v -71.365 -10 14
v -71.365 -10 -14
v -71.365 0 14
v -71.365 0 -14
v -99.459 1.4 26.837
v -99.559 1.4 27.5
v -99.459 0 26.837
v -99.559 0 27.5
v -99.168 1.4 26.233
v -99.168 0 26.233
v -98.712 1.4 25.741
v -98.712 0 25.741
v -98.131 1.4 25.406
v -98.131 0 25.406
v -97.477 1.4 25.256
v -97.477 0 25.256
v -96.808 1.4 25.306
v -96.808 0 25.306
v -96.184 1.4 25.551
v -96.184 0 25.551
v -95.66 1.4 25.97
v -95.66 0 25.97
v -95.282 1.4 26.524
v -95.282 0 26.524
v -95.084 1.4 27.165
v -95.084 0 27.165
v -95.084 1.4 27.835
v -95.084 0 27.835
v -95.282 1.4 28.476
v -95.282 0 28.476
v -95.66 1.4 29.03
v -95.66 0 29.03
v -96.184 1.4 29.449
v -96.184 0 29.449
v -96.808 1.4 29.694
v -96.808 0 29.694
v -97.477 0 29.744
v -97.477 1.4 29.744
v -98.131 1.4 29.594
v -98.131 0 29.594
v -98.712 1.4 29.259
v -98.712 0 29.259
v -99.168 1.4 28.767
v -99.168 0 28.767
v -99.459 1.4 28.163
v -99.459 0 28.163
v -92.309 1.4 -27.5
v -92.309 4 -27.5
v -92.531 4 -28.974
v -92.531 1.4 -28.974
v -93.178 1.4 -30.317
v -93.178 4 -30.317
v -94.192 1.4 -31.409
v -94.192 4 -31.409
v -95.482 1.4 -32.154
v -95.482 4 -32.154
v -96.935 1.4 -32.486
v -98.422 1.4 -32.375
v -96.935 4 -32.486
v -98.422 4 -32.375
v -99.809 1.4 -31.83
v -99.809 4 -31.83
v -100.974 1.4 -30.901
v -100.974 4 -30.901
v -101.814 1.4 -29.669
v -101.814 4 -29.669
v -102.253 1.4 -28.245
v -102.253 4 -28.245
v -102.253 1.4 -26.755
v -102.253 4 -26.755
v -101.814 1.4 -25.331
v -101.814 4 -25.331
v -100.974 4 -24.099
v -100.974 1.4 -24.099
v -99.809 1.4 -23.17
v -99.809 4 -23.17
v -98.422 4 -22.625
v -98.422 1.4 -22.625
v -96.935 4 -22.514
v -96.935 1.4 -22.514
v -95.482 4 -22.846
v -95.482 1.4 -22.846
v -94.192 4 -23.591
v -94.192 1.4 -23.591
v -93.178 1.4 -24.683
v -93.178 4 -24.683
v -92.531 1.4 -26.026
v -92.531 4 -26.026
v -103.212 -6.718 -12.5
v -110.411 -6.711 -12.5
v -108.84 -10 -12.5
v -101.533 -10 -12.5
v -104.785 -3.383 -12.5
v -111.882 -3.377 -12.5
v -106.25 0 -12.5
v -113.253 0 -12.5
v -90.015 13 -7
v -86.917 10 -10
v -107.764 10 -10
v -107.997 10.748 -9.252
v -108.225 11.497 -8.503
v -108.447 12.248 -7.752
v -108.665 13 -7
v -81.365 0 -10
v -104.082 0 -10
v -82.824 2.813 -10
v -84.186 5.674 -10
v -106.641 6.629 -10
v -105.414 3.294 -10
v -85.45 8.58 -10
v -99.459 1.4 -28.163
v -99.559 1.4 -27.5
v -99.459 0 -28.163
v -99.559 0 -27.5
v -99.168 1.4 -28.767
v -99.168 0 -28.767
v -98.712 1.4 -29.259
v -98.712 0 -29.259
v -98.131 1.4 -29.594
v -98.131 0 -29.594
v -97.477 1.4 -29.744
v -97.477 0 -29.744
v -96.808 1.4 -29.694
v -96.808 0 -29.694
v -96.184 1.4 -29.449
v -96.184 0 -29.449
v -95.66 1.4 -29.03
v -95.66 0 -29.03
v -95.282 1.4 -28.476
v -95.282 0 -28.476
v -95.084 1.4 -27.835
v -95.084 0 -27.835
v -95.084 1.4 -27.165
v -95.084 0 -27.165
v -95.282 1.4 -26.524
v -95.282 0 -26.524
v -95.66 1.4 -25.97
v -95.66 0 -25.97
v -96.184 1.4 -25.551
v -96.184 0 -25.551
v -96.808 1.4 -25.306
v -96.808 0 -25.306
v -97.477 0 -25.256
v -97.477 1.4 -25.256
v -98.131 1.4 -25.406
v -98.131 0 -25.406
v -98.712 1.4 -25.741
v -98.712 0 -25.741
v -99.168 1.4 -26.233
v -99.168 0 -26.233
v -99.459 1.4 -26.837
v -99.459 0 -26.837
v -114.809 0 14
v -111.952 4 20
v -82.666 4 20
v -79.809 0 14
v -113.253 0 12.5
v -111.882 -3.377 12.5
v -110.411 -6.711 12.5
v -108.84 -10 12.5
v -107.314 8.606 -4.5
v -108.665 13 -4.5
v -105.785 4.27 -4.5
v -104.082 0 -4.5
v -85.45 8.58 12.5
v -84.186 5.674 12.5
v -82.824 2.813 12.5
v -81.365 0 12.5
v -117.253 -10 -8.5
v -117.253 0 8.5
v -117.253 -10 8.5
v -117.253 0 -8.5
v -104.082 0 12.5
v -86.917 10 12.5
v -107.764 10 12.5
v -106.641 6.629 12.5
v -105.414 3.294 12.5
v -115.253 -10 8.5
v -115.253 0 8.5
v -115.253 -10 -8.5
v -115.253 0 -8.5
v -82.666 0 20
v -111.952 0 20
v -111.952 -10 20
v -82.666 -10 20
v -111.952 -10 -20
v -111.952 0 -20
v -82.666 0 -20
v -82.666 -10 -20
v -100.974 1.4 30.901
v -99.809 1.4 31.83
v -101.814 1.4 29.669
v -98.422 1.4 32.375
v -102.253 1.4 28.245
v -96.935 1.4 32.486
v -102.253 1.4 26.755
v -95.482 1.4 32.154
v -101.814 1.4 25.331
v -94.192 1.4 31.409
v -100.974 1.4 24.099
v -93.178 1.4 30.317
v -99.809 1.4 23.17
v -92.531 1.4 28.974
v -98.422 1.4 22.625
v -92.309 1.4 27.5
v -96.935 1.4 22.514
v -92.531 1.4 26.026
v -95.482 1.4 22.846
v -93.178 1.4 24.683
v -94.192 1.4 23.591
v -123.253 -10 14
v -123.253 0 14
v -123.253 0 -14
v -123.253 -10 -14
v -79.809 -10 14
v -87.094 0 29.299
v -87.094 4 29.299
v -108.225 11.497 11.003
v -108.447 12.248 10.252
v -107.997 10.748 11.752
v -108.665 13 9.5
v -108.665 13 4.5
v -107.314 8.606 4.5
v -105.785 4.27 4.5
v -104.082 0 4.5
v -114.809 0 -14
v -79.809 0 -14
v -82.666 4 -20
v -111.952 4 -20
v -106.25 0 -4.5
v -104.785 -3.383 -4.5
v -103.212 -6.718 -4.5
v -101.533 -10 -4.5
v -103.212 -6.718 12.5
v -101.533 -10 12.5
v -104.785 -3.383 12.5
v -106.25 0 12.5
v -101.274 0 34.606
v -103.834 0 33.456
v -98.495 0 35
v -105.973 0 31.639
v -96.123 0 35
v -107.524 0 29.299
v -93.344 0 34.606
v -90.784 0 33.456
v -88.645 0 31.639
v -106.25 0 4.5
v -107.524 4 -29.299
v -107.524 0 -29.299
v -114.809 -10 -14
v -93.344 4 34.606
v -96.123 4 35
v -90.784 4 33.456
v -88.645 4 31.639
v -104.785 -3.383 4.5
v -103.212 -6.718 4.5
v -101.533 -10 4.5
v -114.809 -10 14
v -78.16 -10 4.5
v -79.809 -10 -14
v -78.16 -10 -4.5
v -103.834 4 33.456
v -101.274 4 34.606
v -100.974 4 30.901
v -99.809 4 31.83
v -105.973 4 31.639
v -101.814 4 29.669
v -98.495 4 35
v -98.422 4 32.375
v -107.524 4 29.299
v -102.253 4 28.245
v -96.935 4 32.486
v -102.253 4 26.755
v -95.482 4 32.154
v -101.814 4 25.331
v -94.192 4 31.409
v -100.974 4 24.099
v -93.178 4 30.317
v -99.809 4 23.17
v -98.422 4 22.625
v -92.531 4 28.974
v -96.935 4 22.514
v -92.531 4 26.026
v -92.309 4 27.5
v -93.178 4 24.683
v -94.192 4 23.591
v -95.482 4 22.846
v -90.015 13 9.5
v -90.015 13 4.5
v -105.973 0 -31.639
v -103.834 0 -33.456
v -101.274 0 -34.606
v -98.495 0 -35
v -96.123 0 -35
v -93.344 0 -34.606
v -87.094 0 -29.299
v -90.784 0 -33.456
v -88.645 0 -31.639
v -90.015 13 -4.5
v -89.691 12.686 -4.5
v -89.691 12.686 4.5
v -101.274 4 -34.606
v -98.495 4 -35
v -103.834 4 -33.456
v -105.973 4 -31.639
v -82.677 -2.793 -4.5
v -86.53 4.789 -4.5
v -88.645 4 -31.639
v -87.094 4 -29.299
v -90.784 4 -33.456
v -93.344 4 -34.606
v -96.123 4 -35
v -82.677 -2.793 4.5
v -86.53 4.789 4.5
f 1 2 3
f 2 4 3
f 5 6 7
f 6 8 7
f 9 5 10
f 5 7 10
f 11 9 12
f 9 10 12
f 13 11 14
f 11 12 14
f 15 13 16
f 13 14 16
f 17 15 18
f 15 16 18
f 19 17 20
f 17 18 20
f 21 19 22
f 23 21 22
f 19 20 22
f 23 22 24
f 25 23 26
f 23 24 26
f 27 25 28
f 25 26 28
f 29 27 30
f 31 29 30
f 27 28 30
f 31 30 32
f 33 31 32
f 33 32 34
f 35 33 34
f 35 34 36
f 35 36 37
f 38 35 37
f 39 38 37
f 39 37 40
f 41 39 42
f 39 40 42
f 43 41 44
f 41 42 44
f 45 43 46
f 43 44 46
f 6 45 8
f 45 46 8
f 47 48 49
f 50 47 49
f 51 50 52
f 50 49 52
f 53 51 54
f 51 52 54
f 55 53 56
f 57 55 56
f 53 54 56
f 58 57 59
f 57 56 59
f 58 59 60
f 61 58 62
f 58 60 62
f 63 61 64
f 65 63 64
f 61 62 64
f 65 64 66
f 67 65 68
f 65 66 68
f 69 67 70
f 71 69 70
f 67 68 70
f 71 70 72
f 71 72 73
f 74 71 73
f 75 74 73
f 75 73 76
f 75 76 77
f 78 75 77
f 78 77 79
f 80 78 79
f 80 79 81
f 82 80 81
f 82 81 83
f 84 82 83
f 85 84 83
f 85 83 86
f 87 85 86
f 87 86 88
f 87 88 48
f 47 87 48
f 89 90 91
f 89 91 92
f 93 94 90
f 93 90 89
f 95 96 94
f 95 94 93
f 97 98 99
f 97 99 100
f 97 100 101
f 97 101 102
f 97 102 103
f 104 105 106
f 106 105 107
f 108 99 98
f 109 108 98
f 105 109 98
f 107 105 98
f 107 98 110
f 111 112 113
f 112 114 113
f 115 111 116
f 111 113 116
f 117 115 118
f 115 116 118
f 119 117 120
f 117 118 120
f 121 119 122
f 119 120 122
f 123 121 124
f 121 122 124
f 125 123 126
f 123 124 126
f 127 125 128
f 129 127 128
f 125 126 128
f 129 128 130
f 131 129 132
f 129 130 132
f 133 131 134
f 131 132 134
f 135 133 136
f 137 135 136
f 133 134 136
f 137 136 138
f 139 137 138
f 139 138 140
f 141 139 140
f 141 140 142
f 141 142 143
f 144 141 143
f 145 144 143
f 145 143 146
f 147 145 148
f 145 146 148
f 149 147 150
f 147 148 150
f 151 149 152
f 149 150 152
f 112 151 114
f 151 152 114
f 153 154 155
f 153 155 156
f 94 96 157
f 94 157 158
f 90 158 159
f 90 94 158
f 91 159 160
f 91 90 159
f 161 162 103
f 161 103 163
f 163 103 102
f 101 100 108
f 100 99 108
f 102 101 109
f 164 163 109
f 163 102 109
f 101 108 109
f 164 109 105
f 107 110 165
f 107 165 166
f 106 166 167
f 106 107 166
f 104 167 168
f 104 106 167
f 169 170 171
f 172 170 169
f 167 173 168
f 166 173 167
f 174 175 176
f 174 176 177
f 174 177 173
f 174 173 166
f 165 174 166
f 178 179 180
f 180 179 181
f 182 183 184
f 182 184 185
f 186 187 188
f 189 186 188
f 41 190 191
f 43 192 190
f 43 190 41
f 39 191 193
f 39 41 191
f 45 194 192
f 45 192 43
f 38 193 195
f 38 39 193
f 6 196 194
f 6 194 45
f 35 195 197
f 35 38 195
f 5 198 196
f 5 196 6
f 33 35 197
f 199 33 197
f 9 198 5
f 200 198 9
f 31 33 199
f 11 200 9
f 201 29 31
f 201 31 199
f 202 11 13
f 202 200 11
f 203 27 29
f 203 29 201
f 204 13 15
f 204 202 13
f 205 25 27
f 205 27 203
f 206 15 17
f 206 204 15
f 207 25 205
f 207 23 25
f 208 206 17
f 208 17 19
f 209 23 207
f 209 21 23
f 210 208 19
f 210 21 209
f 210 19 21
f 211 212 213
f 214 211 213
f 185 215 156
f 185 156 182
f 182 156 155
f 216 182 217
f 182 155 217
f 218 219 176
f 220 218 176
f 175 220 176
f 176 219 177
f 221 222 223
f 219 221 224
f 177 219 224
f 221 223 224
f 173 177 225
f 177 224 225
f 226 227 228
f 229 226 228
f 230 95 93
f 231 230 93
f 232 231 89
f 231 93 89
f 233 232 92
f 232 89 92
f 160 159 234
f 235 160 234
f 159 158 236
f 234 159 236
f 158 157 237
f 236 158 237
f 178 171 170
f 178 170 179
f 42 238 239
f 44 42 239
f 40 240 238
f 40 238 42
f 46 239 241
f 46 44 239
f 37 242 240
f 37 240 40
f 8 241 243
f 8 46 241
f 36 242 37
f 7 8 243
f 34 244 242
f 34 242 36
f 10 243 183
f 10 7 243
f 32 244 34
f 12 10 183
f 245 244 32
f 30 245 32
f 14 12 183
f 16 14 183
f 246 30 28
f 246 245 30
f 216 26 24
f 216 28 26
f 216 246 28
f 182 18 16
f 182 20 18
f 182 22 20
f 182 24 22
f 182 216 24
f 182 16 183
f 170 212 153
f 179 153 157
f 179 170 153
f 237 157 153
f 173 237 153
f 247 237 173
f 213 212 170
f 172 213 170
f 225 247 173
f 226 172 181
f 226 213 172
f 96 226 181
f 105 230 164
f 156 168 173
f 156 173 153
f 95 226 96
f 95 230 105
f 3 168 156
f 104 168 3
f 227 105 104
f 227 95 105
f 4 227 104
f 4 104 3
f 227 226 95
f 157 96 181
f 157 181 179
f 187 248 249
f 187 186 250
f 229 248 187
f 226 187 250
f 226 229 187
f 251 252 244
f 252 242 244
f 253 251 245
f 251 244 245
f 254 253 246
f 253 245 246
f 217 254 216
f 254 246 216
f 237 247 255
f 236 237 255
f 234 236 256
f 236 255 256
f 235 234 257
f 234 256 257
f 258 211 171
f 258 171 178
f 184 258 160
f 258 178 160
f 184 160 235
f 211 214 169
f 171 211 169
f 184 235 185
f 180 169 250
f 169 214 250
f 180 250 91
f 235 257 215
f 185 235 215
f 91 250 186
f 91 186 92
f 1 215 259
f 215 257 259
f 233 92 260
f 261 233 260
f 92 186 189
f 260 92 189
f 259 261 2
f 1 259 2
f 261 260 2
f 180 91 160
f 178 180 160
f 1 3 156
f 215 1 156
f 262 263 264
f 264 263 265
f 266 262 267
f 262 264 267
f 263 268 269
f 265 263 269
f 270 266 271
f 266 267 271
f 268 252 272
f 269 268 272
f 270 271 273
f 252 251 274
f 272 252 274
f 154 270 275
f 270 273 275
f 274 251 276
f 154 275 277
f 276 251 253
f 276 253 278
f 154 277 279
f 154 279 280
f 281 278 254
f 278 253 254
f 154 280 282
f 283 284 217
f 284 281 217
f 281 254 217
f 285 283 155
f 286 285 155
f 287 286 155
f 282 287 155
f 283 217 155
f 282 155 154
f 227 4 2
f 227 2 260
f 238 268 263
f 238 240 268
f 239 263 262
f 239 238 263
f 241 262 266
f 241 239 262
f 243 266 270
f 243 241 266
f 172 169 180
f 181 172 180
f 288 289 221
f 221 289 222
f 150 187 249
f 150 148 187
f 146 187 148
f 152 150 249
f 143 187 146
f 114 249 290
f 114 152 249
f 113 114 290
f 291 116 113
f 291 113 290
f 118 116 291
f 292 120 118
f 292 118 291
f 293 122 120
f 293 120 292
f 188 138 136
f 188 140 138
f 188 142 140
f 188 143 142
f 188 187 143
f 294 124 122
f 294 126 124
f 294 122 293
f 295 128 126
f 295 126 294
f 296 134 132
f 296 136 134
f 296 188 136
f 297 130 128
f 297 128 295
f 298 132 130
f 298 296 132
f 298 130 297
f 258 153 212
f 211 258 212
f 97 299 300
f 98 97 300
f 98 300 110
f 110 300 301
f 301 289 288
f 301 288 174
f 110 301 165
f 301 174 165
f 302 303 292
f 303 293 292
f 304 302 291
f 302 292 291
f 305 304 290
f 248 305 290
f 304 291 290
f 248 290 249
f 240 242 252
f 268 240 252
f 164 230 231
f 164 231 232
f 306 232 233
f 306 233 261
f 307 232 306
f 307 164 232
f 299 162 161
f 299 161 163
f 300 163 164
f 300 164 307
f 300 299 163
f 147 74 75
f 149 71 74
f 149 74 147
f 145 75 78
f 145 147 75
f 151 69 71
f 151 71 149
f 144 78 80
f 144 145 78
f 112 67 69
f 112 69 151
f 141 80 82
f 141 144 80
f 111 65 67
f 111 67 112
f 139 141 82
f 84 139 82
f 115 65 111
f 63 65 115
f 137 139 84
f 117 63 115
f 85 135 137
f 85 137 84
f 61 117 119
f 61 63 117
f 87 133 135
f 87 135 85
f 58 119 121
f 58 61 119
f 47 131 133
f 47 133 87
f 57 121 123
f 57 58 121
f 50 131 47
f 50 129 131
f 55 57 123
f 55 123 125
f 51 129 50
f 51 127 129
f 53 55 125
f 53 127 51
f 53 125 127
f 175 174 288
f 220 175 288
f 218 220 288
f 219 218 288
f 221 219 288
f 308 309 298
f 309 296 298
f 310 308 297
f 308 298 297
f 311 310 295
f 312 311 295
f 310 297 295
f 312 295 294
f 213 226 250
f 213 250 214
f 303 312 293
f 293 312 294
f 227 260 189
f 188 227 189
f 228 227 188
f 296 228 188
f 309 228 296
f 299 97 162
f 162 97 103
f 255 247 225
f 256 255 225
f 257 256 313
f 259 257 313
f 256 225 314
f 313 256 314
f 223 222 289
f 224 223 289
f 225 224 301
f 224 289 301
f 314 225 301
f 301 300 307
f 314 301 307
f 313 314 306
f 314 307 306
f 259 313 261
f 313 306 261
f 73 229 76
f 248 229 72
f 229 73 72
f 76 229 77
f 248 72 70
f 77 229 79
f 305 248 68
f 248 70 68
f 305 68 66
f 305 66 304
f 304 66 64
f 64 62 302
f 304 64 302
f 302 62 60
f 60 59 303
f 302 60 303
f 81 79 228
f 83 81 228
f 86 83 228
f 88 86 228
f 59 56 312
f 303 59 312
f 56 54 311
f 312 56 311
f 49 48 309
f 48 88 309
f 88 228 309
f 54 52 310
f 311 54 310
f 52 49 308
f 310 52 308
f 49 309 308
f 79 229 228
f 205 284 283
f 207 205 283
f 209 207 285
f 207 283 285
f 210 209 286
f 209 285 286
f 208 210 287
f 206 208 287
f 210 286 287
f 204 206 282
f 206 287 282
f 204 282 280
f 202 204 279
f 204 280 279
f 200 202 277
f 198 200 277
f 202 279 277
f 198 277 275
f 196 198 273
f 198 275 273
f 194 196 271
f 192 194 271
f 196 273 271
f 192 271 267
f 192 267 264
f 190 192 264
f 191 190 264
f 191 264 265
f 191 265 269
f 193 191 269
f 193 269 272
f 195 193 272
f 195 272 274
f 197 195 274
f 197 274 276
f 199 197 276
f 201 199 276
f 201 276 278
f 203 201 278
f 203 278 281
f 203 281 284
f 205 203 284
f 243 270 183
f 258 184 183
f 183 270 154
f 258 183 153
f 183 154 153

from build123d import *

# Parameters (mm, degrees)
SCHIZZO2_W                                           = 51.888116
SCHIZZO2_H                                           = 40
ESTRUSIONE_ESTRUSIONE2_DEPTH                         = 10
ESTRUSIONE_ESTRUSIONE3_DEPTH                         = 12.5
ESTRUSIONE_ESTRUSIONE3_DEPTH_BACK                    = 10
SCHIZZO3_R                                           = 113
SCHIZZO3_R_2                                         = 105
SCHIZZO3_R_3                                         = 95
SCHIZZO3_R_4                                         = 92.5
TAGLIO_ESTRUSIONE1_DEPTH                             = 4.5
TAGLIO_ESTRUSIONE1_DEPTH_BACK                        = 4.5
SCHIZZO3_3_R                                         = 115
SCHIZZO3_3_R_2                                       = 113
SCHIZZO3_3_R_3                                       = 105
SCHIZZO3_3_R_4                                       = 95
TAGLIO_ESTRUSIONE2_DEPTH                             = 12.5
TAGLIO_ESTRUSIONE2_DEPTH_BACK                        = 12.5
SCHIZZO3_4_R                                         = 121.5
SCHIZZO3_4_R_2                                       = 115
TAGLIO_ESTRUSIONE3_DEPTH                             = 79.5
TAGLIO_ESTRUSIONE3_DEPTH_BACK                        = 79.5
ESTRUSIONE_ESTRUSIONE5_DEPTH                         = 51.888111
FORO_LAMATO_PER_VITE_M4_A_TESTA_CILINDRI_D           = 4.5
FORO_LAMATO_PER_VITE_M4_A_TESTA_CILINDRI_DEPTH       = 30
FORO_LAMATO_PER_VITE_M4_A_TESTA_CILINDRI_CBORE_D     = 10
FORO_LAMATO_PER_VITE_M4_A_TESTA_CILINDRI_CBORE_DEPTH = 2.6
FORO_LAMATO_PER_VITE_M4_A_TESTA_CILINDRI_TIP         = 1.351936393
SCHIZZO10_W                                          = 2
SCHIZZO10_H                                          = 17
TAGLIO_ESTRUSIONE4_DEPTH                             = 10
TAGLIO_ESTRUSIONE5_DEPTH                             = 33
RACCORDO1_R                                          = 10


with BuildPart() as part:
    # Schizzo2 → Estrusione-Estrusione2 (new body)
    with BuildSketch(Plane(origin=(0, 0, 0), x_dir=(1, 0, 0), z_dir=(0, 1, 0))):
        with Locations((-97.308977, 0)):
            Rectangle(SCHIZZO2_W, SCHIZZO2_H)
    extrude(amount=-ESTRUSIONE_ESTRUSIONE2_DEPTH)

    # Schizzo3 → Estrusione-Estrusione3 (add, two sides: drawn at the far end of the back side and taken through both)
    # profile 1 of 3: a face of its own
    with BuildSketch(Plane.XY.offset(-ESTRUSIONE_ESTRUSIONE3_DEPTH_BACK)):
        with Locations((0, 44)):
            Circle(SCHIZZO3_R)
        with Locations((0, 44)):
            Circle(SCHIZZO3_R_2, mode=Mode.SUBTRACT)
    # profile 2 of 3: a face of its own
    with BuildSketch(Plane.XY.offset(-ESTRUSIONE_ESTRUSIONE3_DEPTH_BACK)):
        with Locations((0, 44)):
            Circle(SCHIZZO3_R_2)
        with Locations((0, 44)):
            Circle(SCHIZZO3_R_3, mode=Mode.SUBTRACT)
    # profile 3 of 3: a face of its own
    with BuildSketch(Plane.XY.offset(-ESTRUSIONE_ESTRUSIONE3_DEPTH_BACK)):
        with Locations((0, 44)):
            Circle(SCHIZZO3_R_3)
        with Locations((0, 44)):
            Circle(SCHIZZO3_R_4, mode=Mode.SUBTRACT)
    extrude(amount=ESTRUSIONE_ESTRUSIONE3_DEPTH + ESTRUSIONE_ESTRUSIONE3_DEPTH_BACK)

    # Schizzo3<3> → Taglio-Estrusione1 (cut, two sides: drawn at the far end of the back side and taken through both)
    # profile 1 of 3: a face of its own
    with BuildSketch(Plane.XY.offset(-TAGLIO_ESTRUSIONE1_DEPTH_BACK)):
        with Locations((0, 44)):
            Circle(SCHIZZO3_3_R)
        with Locations((0, 44)):
            Circle(SCHIZZO3_3_R_2, mode=Mode.SUBTRACT)
    # profile 2 of 3: a face of its own
    with BuildSketch(Plane.XY.offset(-TAGLIO_ESTRUSIONE1_DEPTH_BACK)):
        with Locations((0, 44)):
            Circle(SCHIZZO3_3_R_2)
        with Locations((0, 44)):
            Circle(SCHIZZO3_3_R_3, mode=Mode.SUBTRACT)
    # profile 3 of 3: a face of its own
    with BuildSketch(Plane.XY.offset(-TAGLIO_ESTRUSIONE1_DEPTH_BACK)):
        with Locations((0, 44)):
            Circle(SCHIZZO3_3_R_3)
        with Locations((0, 44)):
            Circle(SCHIZZO3_3_R_4, mode=Mode.SUBTRACT)
    extrude(amount=TAGLIO_ESTRUSIONE1_DEPTH + TAGLIO_ESTRUSIONE1_DEPTH_BACK, mode=Mode.SUBTRACT)

    # Schizzo3<4> → Taglio-Estrusione2 (cut, two sides: drawn at the far end of the back side and taken through both)
    with BuildSketch(Plane.XY.offset(-TAGLIO_ESTRUSIONE2_DEPTH_BACK)):
        with Locations((0, 44)):
            Circle(SCHIZZO3_4_R)
        with Locations((0, 44)):
            Circle(SCHIZZO3_4_R_2, mode=Mode.SUBTRACT)
    extrude(amount=TAGLIO_ESTRUSIONE2_DEPTH + TAGLIO_ESTRUSIONE2_DEPTH_BACK, mode=Mode.SUBTRACT)

    # Schizzo4 → Taglio-Estrusione3 (cut, two sides: drawn at the far end of the back side and taken through both)
    with BuildSketch(Plane.XY.offset(12.5).offset(-TAGLIO_ESTRUSIONE3_DEPTH_BACK)):
        Polygon((150, 13), (150, -10), (150, -80), (-150, -80), (-150, -10), (0, -10), (0, 13), (-150, 13), (-150, 163), (150, 163), align=None)
    extrude(amount=TAGLIO_ESTRUSIONE3_DEPTH + TAGLIO_ESTRUSIONE3_DEPTH_BACK, mode=Mode.SUBTRACT)

    # Smusso1
    # the kernel refuses this chamfer: 4.942054941, 3 mm, written as the material it takes off along each edge
    with BuildSketch(Plane(origin=(-87.150731494, 13, 24.790313744), x_dir=(-0.998955732576957, 0.045688558213574655, 0), z_dir=(0, 0, -1))) as smusso1_piece_1:
        with BuildLine():
            Line((3.009603279, 0), (-2.049272113, -4.468643386))
            Line((-2.049272113, -4.468643386), (-2.138755111, -4.426662964))
            ThreePointArc((-2.138755111, -4.426662964), (-1.049342002, -2.223465239), (-0.091514438, 0.037345286))
            Line((-0.091514438, 0.037345286), (0.004515907, 0.098737882))
            ThreePointArc((0.004515907, 0.098737882), (1.506176357, 0.030057461), (3.014119187, 0.098737882))
            Line((3.014119187, 0.098737882), (3.009603279, 0))
        make_face()
    extrude(amount=47.080627488, mode=Mode.SUBTRACT)
    # the kernel refuses this chamfer: 4.942054941, 3 mm, written as the material it takes off along each edge
    with BuildSketch(Plane(origin=(-116.379670622, 13, -10), x_dir=(0, -0.9996219169112969, -0.02749587661058621), z_dir=(1, 0, 0))) as smusso1_2_piece_1:
        with BuildLine():
            Line((3.086019586, 0), (-0.169641465, -3.081353381))
            Line((-0.169641465, -3.081353381), (-0.22961878, -3.079703628))
            ThreePointArc((-0.22961878, -3.079703628), (-0.102387681, -1.540193489), (-0.059977315, 0.001649753))
            Line((-0.059977315, 0.001649753), (0.001649753, 0.059977315))
            ThreePointArc((0.001649753, 0.059977315), (1.543492994, 0.017566949), (3.087669338, 0.059977315))
            Line((3.087669338, 0.059977315), (3.086019586, 0))
        make_face()
    extrude(amount=34.07955152, mode=Mode.SUBTRACT)
    with BuildSketch(Plane(origin=(-116.379670622, 13, 12.5), x_dir=(0, -0.9996219169112969, 0.02749587661058621), z_dir=(1, 0, 0))) as smusso1_2_piece_2:
        with BuildLine():
            Line((3.086019586, 0), (-0.169641465, 3.081353381))
            Line((-0.169641465, 3.081353381), (-0.22961878, 3.079703628))
            ThreePointArc((-0.22961878, 3.079703628), (-0.102387681, 1.540193489), (-0.059977315, -0.001649753))
            Line((-0.059977315, -0.001649753), (0.001649753, -0.059977315))
            ThreePointArc((0.001649753, -0.059977315), (1.543492994, -0.017566949), (3.087669338, -0.059977315))
            Line((3.087669338, -0.059977315), (3.086019586, 0))
        make_face()
    extrude(amount=34.07955152, mode=Mode.SUBTRACT)

    # Schizzo7 → Estrusione-Estrusione5 (add)
    with BuildSketch(Plane(origin=(-71.364919, 0, 0), x_dir=(0, 0, -1), z_dir=(1, 0, 0))):
        Polygon((-20, 0), (-35, 0), (-35, 4), (-20, 4), (-14, 0), align=None)
        Polygon((20, 4), (35, 4), (35, 0), (20, 0), (14, 0), align=None)
    extrude(amount=-ESTRUSIONE_ESTRUSIONE5_DEPTH)

    # Foro lamato per Vite M4 a testa cilindrica piana-1
    with Locations(Plane(origin=(0, 4, 0), x_dir=(1, 0, 0), z_dir=(0, 1, 0))):
        with Locations((-97.308977, -27.5), (-97.308977, 27.5)):
            CounterBoreHole(FORO_LAMATO_PER_VITE_M4_A_TESTA_CILINDRI_D / 2, FORO_LAMATO_PER_VITE_M4_A_TESTA_CILINDRI_CBORE_D / 2, FORO_LAMATO_PER_VITE_M4_A_TESTA_CILINDRI_CBORE_DEPTH, depth=FORO_LAMATO_PER_VITE_M4_A_TESTA_CILINDRI_DEPTH)
            with Locations((0, 0, -(FORO_LAMATO_PER_VITE_M4_A_TESTA_CILINDRI_DEPTH + FORO_LAMATO_PER_VITE_M4_A_TESTA_CILINDRI_TIP / 2))):  # 118° drill point
                Cone(0, FORO_LAMATO_PER_VITE_M4_A_TESTA_CILINDRI_D / 2, FORO_LAMATO_PER_VITE_M4_A_TESTA_CILINDRI_TIP, mode=Mode.SUBTRACT)

    # Schizzo10 → Taglio-Estrusione4 (cut)
    with BuildSketch(Plane(origin=(0, 0, 0), x_dir=(1, 0, 0), z_dir=(0, 1, 0))):
        with Locations((-116.253035279, 0)):
            Rectangle(SCHIZZO10_W, SCHIZZO10_H)
    extrude(amount=-TAGLIO_ESTRUSIONE4_DEPTH, mode=Mode.SUBTRACT)

    # Schizzo11 → Taglio-Estrusione5 (cut)
    with BuildSketch(Plane(origin=(0, 4, 0), x_dir=(1, 0, 0), z_dir=(0, 1, 0))):
        Polygon((-123.253035, 14), (-123.253035, 35), (-104.808977, 35), (-114.808977, 14), align=None)
        Polygon((-89.808977, 35), (-71.364919, 35), (-71.364919, 14), (-79.808977, 14), align=None)
        Polygon((-123.253035, -14), (-123.253035, -35), (-104.808977, -35), (-114.808977, -14), align=None)
        Polygon((-89.808977, -35), (-71.364919, -35), (-71.364919, -14), (-79.808977, -14), align=None)
    extrude(amount=-TAGLIO_ESTRUSIONE5_DEPTH, mode=Mode.SUBTRACT)

    # Raccordo1
    raccordo1_edges = [part.edges().sort_by_distance(p)[0] for p in [
        (-104.808977, 2, -35),
        (-89.808977, 2, -35),
        (-104.808977, 2, 35),
        (-89.808977, 2, 35),
    ]]
    fillet(raccordo1_edges, radius=RACCORDO1_R)


solid = part.part
